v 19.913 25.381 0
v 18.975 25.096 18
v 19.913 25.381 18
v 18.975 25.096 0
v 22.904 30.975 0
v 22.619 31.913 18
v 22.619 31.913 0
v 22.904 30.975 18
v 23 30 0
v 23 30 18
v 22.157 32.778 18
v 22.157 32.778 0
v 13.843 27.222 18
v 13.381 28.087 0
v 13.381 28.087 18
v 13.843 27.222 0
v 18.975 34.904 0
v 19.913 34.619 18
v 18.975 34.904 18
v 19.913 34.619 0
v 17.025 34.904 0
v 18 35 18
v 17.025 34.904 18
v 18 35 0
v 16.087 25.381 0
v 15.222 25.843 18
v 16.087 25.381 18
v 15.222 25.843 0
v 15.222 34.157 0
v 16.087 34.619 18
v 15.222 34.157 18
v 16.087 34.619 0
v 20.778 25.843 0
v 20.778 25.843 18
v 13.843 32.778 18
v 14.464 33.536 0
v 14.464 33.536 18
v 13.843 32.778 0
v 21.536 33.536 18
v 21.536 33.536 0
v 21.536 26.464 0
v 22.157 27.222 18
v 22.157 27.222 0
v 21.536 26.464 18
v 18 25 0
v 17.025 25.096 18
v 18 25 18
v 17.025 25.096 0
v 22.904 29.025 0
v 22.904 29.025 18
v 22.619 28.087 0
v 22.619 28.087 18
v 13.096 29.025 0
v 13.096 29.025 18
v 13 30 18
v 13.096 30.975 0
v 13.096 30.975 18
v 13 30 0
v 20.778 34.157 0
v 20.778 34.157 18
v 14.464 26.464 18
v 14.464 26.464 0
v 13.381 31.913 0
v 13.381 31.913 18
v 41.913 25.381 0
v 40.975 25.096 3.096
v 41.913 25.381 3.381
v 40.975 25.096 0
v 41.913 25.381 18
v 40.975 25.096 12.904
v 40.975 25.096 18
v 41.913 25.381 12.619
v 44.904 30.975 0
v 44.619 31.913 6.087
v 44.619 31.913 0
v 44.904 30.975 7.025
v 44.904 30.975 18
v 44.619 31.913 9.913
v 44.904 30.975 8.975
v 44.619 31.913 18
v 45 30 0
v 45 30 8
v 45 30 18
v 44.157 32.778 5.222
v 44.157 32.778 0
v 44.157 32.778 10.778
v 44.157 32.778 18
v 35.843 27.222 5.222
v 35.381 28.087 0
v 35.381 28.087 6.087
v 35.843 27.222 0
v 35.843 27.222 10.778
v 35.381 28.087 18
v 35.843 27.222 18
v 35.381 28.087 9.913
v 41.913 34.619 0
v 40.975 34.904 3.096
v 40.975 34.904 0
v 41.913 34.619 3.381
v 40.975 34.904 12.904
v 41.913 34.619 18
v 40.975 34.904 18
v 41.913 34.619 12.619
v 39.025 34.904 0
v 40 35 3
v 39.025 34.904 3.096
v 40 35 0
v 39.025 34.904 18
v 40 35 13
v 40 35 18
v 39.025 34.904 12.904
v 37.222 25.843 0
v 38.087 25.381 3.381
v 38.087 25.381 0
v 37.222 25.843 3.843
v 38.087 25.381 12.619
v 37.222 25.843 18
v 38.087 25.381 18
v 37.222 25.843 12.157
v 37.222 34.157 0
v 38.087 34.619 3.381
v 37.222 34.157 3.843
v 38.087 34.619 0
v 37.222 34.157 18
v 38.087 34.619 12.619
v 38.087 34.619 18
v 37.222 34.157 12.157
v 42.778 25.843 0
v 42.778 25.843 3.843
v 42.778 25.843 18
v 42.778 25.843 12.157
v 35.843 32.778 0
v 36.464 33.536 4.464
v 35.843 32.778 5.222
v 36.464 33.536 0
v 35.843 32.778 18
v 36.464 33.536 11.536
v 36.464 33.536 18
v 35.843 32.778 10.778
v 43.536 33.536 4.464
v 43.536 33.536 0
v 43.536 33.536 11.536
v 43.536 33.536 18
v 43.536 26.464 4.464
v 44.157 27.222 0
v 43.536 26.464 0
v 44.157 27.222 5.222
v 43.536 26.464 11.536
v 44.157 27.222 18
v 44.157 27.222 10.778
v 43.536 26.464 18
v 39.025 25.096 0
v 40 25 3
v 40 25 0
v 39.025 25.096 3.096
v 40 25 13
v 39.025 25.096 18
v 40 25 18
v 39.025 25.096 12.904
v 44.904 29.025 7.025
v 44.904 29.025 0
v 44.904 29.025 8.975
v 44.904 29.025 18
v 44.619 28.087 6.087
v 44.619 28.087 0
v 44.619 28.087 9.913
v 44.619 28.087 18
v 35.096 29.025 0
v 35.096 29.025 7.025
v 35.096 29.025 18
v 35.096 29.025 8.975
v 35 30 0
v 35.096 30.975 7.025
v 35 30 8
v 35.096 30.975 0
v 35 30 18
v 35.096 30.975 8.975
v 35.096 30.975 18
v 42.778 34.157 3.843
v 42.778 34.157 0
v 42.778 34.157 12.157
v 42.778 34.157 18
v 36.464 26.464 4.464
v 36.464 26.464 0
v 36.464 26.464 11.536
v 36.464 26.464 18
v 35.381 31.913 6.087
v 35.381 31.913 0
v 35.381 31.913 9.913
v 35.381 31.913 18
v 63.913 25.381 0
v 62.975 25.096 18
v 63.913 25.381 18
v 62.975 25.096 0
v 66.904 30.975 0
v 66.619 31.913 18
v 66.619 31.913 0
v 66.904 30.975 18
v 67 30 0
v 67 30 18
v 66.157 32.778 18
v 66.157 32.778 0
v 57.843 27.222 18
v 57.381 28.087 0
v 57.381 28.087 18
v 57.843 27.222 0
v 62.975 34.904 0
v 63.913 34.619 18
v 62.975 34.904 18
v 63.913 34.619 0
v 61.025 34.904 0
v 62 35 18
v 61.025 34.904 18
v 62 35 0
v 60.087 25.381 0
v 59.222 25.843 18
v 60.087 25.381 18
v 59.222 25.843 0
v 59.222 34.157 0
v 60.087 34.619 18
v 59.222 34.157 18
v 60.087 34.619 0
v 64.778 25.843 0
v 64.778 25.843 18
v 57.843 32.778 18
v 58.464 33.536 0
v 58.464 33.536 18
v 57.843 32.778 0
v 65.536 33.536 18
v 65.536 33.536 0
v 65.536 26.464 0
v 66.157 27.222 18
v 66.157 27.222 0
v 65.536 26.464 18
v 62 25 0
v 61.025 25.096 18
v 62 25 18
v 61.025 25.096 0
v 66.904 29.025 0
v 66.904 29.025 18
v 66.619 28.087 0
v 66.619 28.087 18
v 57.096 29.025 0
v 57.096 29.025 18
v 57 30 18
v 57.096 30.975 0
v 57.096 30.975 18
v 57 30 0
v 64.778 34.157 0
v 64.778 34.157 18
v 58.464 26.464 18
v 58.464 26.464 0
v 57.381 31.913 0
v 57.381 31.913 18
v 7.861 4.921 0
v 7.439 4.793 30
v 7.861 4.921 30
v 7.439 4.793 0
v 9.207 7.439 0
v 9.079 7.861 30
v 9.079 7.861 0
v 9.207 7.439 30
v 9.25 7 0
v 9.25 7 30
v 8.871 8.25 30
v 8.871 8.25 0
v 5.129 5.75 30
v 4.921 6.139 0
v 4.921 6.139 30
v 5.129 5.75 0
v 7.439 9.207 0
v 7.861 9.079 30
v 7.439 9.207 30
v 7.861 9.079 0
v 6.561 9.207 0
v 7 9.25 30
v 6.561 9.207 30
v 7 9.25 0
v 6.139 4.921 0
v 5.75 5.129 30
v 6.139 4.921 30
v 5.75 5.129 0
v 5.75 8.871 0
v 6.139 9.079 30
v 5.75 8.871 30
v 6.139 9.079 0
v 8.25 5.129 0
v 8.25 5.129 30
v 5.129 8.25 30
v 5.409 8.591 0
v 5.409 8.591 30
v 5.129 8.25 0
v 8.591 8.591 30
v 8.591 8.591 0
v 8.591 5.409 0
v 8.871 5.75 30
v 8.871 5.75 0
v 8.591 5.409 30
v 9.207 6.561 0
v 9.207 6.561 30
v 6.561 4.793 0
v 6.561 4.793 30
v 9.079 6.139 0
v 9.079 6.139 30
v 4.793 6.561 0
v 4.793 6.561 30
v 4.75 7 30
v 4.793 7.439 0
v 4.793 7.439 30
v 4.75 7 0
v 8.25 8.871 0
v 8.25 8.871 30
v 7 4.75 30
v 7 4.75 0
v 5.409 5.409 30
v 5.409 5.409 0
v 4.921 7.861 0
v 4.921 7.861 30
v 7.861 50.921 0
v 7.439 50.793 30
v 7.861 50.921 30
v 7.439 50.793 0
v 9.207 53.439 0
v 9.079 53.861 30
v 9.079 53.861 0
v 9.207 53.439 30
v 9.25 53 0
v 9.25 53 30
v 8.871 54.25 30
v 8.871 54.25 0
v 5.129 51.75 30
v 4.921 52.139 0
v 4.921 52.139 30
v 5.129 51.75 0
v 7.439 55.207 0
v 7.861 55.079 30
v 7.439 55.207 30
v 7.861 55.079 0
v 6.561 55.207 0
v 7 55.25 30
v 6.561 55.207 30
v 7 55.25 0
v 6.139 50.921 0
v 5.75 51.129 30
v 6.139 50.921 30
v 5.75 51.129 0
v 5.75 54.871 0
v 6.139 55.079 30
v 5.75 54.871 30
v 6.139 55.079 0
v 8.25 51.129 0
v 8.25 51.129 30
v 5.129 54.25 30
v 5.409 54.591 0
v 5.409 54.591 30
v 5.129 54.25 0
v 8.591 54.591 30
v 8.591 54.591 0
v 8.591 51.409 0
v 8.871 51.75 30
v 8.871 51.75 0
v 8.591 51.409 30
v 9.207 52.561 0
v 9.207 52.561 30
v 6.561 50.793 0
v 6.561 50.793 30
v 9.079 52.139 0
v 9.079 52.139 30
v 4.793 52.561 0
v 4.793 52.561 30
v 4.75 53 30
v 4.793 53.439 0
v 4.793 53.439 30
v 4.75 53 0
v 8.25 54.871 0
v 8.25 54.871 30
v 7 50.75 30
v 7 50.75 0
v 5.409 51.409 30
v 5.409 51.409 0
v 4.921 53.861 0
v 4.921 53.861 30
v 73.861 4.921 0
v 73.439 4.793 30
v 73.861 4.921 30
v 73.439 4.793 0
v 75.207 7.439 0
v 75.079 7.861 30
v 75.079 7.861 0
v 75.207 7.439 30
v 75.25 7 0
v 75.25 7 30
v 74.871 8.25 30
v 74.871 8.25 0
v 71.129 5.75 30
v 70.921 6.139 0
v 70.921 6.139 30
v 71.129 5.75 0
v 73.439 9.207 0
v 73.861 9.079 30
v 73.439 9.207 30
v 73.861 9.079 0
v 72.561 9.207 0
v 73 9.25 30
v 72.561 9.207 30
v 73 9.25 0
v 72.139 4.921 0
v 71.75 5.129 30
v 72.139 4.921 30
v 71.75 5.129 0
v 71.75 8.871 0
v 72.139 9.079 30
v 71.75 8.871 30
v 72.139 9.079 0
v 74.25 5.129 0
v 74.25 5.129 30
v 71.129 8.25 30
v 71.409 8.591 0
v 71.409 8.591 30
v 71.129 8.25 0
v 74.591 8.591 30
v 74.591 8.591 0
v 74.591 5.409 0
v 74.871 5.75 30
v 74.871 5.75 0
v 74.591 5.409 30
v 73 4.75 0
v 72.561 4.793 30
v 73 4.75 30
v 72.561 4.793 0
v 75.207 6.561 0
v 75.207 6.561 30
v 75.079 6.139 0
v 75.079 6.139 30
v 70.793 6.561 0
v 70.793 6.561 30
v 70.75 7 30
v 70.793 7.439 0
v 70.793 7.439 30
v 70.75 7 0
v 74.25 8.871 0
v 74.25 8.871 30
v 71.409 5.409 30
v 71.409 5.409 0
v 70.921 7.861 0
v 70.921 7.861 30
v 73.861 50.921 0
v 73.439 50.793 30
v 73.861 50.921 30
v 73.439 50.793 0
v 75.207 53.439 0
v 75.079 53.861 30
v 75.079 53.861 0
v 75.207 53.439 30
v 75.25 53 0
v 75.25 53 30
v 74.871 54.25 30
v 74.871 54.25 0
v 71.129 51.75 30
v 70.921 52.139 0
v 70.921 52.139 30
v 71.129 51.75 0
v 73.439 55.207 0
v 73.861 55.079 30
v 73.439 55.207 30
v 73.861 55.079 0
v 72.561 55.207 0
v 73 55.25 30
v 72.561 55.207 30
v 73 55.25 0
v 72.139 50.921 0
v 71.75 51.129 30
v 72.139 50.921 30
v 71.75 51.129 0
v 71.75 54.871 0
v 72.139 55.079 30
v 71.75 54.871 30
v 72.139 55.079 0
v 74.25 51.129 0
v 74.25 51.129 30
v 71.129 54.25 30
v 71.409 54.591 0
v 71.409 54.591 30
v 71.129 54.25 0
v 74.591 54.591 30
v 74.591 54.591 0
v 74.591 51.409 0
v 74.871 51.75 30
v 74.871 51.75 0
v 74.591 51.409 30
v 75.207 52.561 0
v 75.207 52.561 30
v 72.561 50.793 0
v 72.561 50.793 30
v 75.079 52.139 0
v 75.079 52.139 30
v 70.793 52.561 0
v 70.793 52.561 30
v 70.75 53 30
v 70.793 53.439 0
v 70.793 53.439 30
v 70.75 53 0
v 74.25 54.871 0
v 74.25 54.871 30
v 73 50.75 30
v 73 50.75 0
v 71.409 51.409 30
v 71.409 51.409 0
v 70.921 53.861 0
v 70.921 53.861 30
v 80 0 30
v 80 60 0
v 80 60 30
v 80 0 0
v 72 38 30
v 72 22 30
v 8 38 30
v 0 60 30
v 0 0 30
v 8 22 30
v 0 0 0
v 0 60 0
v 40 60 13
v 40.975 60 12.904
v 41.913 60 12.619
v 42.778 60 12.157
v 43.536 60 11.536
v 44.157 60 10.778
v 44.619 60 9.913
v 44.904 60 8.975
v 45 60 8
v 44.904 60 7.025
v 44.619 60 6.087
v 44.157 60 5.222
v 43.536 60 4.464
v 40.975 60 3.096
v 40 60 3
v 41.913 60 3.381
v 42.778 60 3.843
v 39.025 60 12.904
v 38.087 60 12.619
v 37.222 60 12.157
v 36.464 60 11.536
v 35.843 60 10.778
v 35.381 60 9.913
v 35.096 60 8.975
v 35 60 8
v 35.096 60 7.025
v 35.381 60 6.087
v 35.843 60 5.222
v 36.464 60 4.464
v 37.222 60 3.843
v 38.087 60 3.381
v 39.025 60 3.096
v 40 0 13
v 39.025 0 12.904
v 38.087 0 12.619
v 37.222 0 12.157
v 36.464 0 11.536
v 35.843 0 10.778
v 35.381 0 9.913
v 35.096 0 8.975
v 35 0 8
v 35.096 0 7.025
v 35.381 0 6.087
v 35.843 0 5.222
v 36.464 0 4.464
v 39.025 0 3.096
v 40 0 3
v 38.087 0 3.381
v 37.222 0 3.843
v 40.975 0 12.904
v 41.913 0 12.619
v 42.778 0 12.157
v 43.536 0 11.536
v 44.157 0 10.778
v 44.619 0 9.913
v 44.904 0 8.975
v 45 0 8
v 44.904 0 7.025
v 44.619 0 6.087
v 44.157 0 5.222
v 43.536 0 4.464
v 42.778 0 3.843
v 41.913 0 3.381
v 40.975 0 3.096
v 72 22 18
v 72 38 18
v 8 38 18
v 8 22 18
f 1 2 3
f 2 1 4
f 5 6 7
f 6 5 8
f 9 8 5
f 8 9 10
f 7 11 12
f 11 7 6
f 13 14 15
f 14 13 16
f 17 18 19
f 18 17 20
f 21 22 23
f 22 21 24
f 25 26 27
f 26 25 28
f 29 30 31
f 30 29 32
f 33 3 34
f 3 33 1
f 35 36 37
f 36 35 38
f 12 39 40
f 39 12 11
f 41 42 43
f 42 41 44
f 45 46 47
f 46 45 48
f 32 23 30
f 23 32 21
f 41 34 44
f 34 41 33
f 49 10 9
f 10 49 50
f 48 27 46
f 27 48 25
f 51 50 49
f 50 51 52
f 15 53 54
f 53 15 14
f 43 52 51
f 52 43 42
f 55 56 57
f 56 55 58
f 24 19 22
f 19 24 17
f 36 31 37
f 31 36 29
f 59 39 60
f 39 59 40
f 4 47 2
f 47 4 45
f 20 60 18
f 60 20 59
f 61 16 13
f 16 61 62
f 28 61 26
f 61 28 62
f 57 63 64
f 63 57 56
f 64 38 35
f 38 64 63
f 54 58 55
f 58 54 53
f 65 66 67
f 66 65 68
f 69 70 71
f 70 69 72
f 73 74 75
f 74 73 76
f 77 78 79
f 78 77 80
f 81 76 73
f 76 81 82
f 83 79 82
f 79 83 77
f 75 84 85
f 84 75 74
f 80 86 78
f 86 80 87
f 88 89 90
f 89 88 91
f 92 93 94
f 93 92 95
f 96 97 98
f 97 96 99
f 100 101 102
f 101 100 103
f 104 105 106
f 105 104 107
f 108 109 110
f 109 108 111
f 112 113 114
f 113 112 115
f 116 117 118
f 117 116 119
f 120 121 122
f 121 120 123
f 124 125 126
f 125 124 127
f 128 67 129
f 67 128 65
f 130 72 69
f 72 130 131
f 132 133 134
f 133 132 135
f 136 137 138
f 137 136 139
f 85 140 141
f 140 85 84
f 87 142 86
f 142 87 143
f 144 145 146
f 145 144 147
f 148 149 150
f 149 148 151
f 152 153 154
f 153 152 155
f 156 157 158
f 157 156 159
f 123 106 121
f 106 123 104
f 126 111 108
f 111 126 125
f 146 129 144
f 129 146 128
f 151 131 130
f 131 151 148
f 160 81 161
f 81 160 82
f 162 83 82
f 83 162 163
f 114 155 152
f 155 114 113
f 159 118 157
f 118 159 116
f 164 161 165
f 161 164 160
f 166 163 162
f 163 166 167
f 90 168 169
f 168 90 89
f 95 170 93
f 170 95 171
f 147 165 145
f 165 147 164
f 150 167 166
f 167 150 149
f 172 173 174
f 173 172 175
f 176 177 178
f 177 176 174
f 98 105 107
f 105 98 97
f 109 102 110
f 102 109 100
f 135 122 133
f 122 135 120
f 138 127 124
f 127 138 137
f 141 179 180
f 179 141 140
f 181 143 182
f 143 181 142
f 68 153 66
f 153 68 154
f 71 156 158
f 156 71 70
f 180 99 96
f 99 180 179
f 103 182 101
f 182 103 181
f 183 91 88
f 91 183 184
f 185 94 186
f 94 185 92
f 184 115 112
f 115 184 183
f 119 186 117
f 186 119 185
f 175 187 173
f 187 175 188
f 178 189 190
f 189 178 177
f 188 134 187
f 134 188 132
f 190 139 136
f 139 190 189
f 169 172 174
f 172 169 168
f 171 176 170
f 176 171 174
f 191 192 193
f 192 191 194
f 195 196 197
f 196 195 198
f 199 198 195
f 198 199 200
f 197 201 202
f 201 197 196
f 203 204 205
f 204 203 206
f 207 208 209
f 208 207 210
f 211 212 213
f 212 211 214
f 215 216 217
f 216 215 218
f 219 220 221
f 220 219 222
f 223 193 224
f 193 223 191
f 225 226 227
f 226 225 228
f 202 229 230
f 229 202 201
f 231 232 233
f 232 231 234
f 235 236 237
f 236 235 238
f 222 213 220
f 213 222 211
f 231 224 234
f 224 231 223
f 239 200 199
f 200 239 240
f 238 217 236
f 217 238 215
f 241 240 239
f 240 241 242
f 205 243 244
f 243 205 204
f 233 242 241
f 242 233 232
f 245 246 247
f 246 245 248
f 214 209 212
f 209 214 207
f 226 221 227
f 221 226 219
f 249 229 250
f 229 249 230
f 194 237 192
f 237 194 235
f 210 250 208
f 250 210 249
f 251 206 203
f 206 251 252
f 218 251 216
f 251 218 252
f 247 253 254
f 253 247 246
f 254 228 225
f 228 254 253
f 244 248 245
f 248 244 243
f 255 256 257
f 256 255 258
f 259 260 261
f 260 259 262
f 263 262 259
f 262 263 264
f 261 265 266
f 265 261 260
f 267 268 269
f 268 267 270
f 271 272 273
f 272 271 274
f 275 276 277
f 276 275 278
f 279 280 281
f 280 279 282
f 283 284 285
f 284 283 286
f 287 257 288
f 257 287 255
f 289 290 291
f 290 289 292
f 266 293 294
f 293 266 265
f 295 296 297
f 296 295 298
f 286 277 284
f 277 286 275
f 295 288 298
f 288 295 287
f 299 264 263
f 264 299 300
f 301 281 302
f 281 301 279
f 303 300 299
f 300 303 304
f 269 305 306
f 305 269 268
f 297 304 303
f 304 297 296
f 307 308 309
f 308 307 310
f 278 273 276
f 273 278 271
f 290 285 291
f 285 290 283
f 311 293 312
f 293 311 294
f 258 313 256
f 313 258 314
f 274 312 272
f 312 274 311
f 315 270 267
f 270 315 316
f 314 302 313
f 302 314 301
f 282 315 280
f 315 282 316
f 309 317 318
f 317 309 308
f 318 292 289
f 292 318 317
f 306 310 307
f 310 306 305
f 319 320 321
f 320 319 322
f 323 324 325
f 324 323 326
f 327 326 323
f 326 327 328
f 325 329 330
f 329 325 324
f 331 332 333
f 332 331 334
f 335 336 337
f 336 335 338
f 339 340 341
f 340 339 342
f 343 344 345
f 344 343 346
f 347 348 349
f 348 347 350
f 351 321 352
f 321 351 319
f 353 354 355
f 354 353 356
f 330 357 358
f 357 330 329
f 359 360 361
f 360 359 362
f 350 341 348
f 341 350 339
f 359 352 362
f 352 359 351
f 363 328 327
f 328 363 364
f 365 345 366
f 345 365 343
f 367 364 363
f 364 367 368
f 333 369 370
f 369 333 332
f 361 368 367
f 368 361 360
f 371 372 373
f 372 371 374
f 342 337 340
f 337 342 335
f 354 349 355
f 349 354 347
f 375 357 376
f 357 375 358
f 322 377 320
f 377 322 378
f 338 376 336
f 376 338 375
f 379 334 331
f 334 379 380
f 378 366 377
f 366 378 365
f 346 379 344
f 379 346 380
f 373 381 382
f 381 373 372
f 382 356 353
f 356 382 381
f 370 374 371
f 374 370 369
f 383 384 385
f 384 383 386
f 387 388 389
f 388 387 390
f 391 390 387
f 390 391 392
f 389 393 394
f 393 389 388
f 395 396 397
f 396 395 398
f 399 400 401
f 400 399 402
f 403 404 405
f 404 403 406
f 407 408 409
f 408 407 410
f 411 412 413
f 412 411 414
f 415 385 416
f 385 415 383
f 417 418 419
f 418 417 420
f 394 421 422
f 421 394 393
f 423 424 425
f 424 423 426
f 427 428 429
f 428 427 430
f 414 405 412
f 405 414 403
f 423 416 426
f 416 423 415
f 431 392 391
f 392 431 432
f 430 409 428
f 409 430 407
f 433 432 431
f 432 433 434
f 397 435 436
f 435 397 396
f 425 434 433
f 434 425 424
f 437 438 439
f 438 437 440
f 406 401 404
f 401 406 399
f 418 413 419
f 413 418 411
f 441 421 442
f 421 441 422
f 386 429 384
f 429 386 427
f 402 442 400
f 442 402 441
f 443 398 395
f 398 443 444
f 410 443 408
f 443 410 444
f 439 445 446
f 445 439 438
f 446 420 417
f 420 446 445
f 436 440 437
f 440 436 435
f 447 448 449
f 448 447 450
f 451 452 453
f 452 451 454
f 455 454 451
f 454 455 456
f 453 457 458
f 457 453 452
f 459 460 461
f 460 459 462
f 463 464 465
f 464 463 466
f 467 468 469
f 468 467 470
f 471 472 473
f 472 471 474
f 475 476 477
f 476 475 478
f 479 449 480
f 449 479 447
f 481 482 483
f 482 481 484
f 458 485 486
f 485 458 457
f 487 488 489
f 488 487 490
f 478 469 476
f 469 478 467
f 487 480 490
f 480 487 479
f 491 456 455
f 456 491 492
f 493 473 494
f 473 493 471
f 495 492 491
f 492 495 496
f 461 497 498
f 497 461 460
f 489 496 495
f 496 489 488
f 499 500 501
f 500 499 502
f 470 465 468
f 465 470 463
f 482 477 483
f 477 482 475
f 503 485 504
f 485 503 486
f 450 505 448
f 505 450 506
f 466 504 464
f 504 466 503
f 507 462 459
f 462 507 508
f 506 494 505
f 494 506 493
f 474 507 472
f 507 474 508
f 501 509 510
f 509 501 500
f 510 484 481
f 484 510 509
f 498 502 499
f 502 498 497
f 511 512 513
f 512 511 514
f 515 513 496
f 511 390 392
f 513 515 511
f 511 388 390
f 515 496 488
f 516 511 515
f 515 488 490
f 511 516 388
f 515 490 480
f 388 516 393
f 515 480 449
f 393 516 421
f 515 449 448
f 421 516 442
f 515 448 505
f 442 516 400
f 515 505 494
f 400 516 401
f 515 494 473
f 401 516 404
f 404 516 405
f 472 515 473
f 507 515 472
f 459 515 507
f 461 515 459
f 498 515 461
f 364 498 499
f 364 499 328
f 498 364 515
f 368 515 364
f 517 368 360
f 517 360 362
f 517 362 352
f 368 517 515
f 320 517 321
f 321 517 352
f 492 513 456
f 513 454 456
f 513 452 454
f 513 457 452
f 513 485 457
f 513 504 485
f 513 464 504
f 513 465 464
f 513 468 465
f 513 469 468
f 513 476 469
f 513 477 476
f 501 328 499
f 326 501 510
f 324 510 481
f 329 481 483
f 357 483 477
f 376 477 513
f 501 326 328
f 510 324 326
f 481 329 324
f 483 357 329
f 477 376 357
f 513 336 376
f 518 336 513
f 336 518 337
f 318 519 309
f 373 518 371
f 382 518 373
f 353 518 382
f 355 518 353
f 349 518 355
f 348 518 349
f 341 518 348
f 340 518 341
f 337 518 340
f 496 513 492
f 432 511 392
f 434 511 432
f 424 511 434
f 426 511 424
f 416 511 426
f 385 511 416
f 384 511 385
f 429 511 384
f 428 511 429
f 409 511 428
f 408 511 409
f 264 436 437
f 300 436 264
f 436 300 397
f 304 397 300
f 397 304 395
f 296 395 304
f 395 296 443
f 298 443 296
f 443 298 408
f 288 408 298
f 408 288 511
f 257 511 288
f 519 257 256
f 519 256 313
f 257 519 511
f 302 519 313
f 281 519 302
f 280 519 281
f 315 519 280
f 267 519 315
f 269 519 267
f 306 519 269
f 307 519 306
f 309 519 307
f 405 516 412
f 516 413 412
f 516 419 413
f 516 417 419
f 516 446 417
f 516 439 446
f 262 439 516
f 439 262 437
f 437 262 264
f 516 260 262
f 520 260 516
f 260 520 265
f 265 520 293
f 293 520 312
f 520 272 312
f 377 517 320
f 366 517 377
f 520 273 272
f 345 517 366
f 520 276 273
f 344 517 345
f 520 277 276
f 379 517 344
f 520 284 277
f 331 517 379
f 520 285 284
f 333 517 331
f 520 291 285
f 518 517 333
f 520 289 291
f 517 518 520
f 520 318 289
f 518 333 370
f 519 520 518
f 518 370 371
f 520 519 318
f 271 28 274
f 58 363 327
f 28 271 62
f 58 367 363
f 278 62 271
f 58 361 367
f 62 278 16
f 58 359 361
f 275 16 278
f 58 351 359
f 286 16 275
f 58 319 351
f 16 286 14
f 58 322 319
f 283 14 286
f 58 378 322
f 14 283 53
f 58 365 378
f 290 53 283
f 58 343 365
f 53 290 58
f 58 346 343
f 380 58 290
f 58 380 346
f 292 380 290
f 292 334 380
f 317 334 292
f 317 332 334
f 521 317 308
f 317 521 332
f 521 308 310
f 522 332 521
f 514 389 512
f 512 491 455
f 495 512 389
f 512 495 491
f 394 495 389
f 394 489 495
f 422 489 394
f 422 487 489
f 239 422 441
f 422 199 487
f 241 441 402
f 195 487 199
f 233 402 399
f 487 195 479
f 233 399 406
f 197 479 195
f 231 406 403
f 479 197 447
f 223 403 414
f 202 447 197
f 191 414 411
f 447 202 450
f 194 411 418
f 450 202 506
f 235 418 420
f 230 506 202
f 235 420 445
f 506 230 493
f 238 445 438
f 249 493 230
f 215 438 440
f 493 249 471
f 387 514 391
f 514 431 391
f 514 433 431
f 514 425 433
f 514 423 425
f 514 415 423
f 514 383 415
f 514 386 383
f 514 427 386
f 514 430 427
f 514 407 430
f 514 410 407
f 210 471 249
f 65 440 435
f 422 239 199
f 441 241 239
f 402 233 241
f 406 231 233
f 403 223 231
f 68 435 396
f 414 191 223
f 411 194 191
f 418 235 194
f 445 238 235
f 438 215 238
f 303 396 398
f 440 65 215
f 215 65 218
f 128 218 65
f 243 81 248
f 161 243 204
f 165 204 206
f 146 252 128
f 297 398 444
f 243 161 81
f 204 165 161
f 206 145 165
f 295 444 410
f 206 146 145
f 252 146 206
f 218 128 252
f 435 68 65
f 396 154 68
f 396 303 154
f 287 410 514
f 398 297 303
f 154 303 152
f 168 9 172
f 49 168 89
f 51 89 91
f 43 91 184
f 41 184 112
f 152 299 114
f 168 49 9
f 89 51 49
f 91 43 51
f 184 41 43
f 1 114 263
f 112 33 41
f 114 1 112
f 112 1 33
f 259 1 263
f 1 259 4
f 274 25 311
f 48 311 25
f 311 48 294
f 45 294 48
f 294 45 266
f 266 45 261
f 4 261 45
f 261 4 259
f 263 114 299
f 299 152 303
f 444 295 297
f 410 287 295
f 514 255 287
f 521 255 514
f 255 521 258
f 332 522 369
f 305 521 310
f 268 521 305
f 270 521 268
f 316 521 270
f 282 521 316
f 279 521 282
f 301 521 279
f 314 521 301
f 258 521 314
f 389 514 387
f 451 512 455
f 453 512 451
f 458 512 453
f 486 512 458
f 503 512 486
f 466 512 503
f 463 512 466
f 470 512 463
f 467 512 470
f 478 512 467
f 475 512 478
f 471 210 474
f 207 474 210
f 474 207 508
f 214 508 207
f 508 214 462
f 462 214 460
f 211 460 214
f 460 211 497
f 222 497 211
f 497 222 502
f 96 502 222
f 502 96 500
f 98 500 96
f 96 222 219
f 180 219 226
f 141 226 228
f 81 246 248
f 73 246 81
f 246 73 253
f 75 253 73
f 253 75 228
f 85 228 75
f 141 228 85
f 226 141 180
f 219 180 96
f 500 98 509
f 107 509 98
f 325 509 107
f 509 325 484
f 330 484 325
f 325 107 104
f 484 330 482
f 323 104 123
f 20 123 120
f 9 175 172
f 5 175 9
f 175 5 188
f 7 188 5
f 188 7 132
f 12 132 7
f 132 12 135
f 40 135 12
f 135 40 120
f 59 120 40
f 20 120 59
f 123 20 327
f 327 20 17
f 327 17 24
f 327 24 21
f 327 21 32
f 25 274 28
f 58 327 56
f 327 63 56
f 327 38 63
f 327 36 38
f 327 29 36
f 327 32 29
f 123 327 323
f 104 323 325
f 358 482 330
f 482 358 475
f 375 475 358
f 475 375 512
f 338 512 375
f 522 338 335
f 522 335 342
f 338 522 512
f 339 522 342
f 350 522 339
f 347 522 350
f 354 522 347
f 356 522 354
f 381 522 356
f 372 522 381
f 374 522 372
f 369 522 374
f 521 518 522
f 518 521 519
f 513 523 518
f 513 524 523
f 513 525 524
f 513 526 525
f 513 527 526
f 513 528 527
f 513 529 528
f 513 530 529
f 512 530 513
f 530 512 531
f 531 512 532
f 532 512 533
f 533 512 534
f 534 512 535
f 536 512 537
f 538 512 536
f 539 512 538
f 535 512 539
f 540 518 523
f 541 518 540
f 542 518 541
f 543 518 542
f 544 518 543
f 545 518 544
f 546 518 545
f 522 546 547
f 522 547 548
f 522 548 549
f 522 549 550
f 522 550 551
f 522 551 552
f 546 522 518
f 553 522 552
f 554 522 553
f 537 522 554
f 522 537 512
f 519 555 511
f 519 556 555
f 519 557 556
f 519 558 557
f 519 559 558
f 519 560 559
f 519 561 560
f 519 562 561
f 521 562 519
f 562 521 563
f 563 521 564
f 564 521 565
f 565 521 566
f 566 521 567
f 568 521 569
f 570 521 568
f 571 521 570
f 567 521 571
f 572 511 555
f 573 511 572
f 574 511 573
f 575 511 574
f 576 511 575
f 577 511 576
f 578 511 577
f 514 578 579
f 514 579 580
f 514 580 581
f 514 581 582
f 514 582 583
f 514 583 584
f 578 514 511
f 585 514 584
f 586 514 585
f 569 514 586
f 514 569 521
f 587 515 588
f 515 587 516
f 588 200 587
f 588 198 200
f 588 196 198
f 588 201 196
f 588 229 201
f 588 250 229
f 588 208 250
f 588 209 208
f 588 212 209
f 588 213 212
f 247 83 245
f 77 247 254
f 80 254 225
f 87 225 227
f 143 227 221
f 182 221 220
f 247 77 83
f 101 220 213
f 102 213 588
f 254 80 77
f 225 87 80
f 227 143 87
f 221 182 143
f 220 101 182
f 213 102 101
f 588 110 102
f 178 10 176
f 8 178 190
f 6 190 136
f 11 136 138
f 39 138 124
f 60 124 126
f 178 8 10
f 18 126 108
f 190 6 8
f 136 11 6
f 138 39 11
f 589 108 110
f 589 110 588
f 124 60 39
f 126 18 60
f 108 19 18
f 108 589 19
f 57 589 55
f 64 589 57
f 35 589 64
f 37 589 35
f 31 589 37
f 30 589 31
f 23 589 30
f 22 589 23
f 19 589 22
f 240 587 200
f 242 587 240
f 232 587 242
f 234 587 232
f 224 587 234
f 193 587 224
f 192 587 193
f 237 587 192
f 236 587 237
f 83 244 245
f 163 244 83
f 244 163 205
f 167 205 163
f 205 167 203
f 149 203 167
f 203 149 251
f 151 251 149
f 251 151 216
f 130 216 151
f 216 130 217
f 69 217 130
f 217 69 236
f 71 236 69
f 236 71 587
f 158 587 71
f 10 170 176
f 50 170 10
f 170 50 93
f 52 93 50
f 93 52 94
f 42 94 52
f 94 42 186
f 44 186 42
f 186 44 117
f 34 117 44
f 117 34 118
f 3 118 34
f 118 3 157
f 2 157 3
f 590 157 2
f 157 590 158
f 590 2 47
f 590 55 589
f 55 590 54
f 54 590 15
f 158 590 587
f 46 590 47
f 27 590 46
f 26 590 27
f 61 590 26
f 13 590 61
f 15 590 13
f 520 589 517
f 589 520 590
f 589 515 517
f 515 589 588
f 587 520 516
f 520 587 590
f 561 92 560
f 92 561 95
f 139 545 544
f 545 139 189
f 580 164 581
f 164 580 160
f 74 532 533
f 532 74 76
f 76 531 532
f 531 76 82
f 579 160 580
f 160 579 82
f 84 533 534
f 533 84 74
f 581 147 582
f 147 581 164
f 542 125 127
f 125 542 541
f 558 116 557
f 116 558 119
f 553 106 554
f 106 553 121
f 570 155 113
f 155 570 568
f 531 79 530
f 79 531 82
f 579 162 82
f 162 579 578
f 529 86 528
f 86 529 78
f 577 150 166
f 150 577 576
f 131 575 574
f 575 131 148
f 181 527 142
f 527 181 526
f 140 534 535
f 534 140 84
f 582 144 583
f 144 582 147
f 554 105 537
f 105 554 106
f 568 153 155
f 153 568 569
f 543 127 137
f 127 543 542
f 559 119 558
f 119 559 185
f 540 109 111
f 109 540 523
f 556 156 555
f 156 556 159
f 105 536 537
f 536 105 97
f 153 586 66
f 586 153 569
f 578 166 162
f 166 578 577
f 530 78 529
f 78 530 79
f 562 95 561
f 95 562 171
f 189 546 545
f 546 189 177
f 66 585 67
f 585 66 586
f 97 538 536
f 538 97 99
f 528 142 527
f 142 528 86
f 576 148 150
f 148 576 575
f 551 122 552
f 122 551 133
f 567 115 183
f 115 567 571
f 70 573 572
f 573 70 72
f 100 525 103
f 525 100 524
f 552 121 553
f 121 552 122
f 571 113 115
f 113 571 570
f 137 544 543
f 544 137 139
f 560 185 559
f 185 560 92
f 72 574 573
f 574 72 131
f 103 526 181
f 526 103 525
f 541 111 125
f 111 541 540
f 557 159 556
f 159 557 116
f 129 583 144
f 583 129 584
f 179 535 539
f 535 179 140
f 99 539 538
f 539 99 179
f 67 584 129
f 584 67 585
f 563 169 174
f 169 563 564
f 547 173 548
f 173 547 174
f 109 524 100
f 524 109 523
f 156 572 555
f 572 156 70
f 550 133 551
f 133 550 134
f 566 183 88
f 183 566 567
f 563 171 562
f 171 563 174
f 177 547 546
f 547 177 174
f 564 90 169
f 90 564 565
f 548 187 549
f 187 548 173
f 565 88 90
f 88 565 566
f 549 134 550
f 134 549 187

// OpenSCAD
$fn = 32;

// ----------------------------------------------------------------------
// Manifold block: side_outlet manifold
// ----------------------------------------------------------------------

// --- parameters (mm) ---
block_l = 80;             // block length, X
block_w = 60;             // block width, Y
block_h = 30;             // block height, Z
port_d = 10;              // port bore diameter
port_pitch = 22;          // port pitch along X
gallery_d = 16;           // top gallery width, Y
gallery_depth = 12;       // gallery pocket depth
wall_p = 8;               // gallery end wall thickness, X
mnt_d = 4.5;              // mounting hole diameter
mnt_in = 7;               // mounting hole inset from the edges
out_d = 10;               // outlet bore diameter
out_z = 8;                // outlet axis height

n_ports = 3;  // ports in the row
port_x0 = (block_l - (n_ports - 1) * port_pitch) / 2;  // first port X

difference() {
  cube([block_l, block_w, block_h]);
  for (i = [0 : n_ports - 1])
    translate([port_x0 + i * port_pitch, block_w / 2, -1])
      cylinder(h = block_h + 2, d = port_d);
  translate([wall_p, block_w / 2 - gallery_d / 2, block_h - gallery_depth])
    cube([block_l - 2 * wall_p, gallery_d, gallery_depth + 1]);
  for (cx = [mnt_in, block_l - mnt_in])
    for (cy = [mnt_in, block_w - mnt_in])
      translate([cx, cy, -1]) cylinder(h = block_h + 2, d = mnt_d);
  translate([block_l / 2, -1, out_z]) rotate([-90, 0, 0])
    cylinder(h = block_w + 2, d = out_d);
}
